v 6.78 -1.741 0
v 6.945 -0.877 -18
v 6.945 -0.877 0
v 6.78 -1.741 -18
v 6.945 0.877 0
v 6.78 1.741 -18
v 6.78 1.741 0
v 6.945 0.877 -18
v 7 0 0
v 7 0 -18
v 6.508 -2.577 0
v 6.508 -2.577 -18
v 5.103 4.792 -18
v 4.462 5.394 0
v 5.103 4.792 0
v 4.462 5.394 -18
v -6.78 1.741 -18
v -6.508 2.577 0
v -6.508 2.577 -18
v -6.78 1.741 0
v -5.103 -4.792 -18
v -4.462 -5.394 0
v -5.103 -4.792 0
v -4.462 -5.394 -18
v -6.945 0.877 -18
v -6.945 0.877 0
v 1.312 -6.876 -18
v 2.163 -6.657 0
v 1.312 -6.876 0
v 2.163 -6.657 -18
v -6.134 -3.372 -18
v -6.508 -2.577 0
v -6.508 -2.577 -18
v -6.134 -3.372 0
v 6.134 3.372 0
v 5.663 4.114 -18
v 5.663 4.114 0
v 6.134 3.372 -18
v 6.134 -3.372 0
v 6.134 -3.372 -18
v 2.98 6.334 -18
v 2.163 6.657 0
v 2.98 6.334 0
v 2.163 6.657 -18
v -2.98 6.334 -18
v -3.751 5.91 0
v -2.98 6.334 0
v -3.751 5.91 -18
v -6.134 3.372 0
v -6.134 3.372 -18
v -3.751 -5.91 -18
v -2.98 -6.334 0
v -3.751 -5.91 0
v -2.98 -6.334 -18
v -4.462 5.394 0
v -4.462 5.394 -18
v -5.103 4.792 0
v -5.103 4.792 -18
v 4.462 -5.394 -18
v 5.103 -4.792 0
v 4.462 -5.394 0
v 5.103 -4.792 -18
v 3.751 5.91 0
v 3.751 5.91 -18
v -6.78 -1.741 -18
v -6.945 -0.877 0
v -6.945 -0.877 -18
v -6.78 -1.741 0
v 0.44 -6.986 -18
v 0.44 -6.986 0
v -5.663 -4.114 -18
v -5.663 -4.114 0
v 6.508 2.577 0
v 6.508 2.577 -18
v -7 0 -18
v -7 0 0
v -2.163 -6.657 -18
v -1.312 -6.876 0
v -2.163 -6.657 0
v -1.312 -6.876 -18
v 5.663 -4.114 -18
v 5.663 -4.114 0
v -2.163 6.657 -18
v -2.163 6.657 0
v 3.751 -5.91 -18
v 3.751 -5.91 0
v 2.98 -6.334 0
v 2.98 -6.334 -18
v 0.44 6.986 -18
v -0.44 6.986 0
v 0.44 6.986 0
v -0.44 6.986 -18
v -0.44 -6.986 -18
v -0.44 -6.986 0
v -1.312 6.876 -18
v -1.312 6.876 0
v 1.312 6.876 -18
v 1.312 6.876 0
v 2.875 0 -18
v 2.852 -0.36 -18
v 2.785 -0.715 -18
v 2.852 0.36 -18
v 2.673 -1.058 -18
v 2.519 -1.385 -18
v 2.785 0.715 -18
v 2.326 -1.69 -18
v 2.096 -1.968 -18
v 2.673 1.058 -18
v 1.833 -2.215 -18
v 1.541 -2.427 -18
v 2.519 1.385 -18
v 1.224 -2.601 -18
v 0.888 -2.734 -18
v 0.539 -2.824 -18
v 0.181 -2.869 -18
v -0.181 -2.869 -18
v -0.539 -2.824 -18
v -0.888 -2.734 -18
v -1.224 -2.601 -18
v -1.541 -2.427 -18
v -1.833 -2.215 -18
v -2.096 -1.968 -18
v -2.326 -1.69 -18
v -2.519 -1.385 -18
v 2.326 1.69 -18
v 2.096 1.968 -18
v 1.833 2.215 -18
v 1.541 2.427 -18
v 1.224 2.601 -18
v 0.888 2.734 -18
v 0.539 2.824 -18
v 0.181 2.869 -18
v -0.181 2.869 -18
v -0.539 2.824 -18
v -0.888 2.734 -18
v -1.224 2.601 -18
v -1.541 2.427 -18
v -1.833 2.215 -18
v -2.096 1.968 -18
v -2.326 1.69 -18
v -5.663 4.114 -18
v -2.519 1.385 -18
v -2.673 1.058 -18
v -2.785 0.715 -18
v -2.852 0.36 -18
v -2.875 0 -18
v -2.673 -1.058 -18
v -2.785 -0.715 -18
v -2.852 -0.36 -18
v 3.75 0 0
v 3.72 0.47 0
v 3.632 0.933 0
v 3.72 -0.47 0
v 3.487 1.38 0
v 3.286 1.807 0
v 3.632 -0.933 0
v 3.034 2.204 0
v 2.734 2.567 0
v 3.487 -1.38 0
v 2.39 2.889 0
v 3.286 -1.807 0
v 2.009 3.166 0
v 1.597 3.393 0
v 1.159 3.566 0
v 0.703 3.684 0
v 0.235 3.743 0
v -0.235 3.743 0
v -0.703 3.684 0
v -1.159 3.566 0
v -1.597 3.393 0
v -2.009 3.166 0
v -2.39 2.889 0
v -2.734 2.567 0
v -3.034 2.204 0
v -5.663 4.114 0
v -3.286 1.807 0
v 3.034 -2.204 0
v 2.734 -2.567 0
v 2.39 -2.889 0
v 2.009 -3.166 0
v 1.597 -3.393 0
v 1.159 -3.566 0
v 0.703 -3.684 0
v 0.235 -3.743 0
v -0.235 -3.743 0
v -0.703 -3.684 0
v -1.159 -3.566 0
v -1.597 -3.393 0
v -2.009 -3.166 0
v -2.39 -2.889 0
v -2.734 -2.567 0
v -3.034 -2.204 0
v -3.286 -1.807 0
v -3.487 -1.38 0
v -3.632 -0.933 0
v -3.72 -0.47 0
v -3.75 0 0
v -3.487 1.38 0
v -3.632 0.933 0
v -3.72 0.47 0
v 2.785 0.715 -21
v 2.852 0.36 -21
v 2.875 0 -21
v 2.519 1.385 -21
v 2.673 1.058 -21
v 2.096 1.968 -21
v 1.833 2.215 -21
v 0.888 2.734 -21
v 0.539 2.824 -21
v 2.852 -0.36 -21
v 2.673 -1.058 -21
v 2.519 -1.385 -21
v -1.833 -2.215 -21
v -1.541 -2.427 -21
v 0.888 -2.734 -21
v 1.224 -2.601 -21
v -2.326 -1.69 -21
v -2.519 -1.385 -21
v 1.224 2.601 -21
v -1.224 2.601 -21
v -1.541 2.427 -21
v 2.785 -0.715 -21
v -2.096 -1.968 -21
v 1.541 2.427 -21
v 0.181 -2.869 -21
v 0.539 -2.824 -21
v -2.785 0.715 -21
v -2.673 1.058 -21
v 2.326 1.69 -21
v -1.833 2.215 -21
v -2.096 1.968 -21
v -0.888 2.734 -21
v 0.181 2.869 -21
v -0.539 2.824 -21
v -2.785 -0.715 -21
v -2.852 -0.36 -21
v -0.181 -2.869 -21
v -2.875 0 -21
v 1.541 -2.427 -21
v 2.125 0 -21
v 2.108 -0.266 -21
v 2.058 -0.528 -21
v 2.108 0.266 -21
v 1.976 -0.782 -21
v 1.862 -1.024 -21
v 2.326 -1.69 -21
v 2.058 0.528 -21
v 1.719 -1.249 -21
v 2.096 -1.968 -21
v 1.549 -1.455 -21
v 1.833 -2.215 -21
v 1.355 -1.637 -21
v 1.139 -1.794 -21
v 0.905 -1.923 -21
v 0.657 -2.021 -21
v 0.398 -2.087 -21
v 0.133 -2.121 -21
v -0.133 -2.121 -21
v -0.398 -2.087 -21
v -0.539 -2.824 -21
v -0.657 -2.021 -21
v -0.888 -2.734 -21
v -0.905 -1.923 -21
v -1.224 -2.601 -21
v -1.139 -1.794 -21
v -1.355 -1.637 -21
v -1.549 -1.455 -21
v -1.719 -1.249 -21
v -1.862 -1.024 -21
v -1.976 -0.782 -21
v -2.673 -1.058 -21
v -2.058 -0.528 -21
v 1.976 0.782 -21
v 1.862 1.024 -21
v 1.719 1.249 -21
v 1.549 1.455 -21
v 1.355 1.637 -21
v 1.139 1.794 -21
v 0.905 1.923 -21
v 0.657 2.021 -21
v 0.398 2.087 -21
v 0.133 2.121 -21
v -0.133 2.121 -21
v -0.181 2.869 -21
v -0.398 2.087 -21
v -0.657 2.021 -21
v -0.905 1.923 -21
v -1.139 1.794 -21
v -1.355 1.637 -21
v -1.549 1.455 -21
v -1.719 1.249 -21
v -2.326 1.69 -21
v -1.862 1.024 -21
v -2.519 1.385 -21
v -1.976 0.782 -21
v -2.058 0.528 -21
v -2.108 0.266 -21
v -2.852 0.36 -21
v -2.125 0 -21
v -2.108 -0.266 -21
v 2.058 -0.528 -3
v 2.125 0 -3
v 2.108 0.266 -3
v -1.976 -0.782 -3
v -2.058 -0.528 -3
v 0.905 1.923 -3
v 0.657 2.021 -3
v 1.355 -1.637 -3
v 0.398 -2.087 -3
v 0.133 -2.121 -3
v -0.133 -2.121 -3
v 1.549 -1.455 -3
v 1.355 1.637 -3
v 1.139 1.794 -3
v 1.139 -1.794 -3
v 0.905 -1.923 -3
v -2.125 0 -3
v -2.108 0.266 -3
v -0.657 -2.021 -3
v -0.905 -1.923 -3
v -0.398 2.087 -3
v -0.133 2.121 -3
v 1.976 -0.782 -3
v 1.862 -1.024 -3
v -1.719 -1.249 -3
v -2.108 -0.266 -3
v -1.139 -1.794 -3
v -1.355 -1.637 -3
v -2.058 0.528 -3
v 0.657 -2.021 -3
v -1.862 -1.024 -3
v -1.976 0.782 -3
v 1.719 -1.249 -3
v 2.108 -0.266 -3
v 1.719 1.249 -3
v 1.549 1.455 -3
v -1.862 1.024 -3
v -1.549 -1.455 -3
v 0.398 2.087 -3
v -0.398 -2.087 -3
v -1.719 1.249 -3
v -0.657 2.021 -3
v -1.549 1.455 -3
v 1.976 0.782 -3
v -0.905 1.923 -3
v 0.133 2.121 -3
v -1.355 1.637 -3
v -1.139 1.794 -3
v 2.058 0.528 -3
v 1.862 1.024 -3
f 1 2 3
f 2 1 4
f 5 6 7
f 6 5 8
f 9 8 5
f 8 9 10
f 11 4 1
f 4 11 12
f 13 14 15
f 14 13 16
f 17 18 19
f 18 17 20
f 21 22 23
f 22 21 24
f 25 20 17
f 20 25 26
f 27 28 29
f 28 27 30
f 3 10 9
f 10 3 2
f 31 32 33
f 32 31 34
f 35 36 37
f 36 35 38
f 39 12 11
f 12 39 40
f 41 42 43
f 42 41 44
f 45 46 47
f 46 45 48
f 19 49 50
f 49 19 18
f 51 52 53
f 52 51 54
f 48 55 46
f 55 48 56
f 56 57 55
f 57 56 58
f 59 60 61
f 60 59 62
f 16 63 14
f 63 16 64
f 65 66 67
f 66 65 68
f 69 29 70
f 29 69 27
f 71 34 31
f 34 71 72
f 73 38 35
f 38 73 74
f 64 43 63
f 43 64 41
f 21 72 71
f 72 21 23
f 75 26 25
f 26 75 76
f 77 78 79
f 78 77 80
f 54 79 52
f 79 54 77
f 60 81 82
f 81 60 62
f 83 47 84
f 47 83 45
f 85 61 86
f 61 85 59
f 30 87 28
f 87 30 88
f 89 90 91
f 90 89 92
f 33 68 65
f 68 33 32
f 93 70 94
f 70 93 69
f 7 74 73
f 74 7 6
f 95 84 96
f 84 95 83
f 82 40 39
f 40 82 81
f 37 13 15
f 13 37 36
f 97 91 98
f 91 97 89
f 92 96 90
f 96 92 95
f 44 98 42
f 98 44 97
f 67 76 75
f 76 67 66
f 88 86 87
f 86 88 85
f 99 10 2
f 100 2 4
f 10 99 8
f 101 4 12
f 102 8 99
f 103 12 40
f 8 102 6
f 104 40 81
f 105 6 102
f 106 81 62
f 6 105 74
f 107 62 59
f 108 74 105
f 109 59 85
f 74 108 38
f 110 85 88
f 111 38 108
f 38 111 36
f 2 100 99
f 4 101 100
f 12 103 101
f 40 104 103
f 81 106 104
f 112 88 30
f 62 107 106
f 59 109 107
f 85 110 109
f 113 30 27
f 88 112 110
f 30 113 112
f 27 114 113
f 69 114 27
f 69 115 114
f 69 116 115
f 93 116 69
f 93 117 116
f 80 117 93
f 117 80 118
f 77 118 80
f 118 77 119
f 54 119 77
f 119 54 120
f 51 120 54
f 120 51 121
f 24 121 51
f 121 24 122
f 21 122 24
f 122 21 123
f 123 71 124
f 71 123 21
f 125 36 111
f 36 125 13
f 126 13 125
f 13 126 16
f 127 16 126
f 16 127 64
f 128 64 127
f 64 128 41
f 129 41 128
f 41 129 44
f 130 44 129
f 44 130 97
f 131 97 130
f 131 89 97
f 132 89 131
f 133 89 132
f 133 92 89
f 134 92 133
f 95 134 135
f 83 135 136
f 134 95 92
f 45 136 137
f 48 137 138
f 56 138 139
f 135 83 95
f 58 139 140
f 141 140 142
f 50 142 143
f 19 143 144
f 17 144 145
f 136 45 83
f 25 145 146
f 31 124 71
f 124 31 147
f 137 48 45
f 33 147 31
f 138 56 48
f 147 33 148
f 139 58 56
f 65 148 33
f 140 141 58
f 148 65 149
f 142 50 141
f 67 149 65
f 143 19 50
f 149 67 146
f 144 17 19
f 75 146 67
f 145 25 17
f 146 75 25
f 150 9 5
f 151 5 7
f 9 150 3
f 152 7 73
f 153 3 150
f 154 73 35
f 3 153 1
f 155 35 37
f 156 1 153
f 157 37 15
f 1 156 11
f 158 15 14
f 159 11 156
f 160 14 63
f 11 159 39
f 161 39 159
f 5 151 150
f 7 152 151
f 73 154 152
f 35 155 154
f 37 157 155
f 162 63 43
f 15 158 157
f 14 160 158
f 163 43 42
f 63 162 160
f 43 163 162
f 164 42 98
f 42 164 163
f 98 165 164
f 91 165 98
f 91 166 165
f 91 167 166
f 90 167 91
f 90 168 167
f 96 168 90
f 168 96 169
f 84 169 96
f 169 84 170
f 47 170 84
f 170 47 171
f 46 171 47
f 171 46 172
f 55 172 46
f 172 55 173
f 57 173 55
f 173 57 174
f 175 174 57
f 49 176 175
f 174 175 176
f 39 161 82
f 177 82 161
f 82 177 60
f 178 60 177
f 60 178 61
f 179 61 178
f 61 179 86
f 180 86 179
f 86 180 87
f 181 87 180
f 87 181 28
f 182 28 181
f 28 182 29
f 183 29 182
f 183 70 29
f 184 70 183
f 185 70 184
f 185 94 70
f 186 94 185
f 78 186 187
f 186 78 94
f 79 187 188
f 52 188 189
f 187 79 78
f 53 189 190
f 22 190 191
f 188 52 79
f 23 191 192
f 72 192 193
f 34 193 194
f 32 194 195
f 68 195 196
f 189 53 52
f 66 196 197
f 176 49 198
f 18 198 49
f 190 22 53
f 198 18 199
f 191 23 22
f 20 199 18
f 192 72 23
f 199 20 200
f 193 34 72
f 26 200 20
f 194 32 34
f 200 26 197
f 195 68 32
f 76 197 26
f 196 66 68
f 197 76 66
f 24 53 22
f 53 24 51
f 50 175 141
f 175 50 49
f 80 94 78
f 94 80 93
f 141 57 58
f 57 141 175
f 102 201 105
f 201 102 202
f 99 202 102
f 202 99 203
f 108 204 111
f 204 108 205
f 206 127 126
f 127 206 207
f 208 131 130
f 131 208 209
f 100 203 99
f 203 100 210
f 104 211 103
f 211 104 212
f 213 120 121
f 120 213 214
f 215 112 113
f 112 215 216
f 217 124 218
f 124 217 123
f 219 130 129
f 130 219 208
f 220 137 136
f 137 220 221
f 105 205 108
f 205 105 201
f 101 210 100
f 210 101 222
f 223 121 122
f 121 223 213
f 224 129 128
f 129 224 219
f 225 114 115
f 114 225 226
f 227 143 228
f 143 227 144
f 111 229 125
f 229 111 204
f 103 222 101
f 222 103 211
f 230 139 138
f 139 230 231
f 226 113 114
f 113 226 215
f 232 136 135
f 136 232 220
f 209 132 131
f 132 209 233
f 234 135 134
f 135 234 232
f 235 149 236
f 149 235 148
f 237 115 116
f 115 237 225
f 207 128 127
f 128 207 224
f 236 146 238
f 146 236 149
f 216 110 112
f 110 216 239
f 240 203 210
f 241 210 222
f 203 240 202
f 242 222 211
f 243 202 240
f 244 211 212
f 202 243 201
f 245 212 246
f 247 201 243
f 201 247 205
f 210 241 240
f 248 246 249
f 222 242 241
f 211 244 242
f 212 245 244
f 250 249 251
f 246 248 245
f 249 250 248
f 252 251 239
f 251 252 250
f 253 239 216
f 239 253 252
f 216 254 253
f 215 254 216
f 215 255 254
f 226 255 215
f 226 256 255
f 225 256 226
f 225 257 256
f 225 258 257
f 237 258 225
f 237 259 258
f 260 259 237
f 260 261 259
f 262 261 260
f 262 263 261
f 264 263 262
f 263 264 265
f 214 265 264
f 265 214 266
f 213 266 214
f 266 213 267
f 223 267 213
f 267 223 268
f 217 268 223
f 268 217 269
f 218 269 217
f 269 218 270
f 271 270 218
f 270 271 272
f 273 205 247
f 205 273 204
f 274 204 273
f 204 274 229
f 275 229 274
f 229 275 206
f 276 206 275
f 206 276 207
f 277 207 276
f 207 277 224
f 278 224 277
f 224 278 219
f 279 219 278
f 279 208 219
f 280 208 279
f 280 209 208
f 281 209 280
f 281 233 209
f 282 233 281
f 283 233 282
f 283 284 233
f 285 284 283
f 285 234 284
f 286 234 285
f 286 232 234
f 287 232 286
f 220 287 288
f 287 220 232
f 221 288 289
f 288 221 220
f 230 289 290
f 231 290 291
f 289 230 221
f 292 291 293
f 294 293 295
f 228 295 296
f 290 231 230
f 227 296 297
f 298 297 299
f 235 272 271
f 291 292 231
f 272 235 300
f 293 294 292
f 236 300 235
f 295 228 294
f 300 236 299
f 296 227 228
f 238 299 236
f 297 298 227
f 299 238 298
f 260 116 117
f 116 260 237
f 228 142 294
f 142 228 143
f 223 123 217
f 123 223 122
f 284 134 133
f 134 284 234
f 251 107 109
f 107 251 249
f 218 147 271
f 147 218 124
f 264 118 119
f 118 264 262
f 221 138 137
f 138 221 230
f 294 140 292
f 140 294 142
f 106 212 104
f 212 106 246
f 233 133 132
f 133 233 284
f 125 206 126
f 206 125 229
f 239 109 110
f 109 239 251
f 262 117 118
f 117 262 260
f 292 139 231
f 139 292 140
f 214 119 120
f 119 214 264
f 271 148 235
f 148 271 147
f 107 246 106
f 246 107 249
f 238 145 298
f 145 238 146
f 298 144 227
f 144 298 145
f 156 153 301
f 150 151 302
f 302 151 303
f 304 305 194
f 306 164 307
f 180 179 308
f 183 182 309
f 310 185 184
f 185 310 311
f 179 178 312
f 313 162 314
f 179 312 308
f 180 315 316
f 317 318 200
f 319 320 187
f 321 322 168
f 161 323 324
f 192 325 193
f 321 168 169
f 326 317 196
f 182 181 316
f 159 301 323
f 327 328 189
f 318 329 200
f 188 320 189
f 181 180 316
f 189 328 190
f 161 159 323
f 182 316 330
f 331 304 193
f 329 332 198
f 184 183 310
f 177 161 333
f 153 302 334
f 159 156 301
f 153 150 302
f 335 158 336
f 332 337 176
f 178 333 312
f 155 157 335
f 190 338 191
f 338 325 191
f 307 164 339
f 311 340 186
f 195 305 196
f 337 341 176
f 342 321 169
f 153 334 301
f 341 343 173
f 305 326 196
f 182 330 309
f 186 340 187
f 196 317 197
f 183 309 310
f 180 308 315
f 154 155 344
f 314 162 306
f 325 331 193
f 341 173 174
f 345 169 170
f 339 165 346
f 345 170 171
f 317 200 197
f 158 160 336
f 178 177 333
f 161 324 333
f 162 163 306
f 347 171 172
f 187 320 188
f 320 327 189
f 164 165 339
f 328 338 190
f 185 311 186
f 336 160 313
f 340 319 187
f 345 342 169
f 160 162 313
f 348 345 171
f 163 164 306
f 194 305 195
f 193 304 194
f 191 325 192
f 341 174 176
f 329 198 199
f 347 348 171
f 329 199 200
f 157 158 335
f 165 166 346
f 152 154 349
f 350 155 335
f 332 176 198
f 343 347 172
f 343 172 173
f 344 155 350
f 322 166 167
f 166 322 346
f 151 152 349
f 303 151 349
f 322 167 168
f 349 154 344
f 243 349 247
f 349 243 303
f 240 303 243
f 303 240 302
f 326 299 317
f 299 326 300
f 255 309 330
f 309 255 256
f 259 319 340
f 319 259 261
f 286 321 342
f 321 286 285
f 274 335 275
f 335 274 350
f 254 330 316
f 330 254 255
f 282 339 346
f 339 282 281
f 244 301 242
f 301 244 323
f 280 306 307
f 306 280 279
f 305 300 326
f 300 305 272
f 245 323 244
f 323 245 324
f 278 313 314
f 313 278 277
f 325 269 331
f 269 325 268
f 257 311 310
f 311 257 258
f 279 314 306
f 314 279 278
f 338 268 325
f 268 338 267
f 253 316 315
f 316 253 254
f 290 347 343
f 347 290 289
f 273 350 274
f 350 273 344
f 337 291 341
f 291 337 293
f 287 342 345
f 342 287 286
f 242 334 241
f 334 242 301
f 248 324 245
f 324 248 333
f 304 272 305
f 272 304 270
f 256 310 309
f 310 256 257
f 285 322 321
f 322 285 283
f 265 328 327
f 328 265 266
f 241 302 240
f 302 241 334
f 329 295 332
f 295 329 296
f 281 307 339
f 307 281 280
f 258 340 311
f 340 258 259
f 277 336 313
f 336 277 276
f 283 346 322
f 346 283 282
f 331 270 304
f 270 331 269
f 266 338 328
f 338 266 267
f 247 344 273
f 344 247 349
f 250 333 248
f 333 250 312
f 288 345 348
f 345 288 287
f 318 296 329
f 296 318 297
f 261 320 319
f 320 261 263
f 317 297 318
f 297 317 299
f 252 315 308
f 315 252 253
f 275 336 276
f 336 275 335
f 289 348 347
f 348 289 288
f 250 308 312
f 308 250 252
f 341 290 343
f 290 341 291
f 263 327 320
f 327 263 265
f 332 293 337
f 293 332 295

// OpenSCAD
$fn = 50;

difference() {
	union() {
		translate(v = [0, 0, -18.0]) {
			cylinder(h = 18, r = 7.0);
		}
		#translate(v = [0, 0, -21.0]) {
			cylinder(h = 21, r = 2.875);
		}
	}
	union() {
		translate(v = [0, 0, 0]) {
			rotate(a = [0, 0, 0]) {
				difference() {
					union() {
						translate(v = [0, 0, -21.0]) {
							cylinder(h = 21, r = 2.0);
						}
						translate(v = [0, 0, -3]) {
							cylinder(h = 3, r1 = 2.125, r2 = 3.75);
						}
						translate(v = [0, 0, -21.0]) {
							cylinder(h = 21, r = 2.125);
						}
						translate(v = [0, 0, -21.0]) {
							cylinder(h = 21, r = 2.0);
						}
					}
					union();
				}
			}
		}
	}
}
